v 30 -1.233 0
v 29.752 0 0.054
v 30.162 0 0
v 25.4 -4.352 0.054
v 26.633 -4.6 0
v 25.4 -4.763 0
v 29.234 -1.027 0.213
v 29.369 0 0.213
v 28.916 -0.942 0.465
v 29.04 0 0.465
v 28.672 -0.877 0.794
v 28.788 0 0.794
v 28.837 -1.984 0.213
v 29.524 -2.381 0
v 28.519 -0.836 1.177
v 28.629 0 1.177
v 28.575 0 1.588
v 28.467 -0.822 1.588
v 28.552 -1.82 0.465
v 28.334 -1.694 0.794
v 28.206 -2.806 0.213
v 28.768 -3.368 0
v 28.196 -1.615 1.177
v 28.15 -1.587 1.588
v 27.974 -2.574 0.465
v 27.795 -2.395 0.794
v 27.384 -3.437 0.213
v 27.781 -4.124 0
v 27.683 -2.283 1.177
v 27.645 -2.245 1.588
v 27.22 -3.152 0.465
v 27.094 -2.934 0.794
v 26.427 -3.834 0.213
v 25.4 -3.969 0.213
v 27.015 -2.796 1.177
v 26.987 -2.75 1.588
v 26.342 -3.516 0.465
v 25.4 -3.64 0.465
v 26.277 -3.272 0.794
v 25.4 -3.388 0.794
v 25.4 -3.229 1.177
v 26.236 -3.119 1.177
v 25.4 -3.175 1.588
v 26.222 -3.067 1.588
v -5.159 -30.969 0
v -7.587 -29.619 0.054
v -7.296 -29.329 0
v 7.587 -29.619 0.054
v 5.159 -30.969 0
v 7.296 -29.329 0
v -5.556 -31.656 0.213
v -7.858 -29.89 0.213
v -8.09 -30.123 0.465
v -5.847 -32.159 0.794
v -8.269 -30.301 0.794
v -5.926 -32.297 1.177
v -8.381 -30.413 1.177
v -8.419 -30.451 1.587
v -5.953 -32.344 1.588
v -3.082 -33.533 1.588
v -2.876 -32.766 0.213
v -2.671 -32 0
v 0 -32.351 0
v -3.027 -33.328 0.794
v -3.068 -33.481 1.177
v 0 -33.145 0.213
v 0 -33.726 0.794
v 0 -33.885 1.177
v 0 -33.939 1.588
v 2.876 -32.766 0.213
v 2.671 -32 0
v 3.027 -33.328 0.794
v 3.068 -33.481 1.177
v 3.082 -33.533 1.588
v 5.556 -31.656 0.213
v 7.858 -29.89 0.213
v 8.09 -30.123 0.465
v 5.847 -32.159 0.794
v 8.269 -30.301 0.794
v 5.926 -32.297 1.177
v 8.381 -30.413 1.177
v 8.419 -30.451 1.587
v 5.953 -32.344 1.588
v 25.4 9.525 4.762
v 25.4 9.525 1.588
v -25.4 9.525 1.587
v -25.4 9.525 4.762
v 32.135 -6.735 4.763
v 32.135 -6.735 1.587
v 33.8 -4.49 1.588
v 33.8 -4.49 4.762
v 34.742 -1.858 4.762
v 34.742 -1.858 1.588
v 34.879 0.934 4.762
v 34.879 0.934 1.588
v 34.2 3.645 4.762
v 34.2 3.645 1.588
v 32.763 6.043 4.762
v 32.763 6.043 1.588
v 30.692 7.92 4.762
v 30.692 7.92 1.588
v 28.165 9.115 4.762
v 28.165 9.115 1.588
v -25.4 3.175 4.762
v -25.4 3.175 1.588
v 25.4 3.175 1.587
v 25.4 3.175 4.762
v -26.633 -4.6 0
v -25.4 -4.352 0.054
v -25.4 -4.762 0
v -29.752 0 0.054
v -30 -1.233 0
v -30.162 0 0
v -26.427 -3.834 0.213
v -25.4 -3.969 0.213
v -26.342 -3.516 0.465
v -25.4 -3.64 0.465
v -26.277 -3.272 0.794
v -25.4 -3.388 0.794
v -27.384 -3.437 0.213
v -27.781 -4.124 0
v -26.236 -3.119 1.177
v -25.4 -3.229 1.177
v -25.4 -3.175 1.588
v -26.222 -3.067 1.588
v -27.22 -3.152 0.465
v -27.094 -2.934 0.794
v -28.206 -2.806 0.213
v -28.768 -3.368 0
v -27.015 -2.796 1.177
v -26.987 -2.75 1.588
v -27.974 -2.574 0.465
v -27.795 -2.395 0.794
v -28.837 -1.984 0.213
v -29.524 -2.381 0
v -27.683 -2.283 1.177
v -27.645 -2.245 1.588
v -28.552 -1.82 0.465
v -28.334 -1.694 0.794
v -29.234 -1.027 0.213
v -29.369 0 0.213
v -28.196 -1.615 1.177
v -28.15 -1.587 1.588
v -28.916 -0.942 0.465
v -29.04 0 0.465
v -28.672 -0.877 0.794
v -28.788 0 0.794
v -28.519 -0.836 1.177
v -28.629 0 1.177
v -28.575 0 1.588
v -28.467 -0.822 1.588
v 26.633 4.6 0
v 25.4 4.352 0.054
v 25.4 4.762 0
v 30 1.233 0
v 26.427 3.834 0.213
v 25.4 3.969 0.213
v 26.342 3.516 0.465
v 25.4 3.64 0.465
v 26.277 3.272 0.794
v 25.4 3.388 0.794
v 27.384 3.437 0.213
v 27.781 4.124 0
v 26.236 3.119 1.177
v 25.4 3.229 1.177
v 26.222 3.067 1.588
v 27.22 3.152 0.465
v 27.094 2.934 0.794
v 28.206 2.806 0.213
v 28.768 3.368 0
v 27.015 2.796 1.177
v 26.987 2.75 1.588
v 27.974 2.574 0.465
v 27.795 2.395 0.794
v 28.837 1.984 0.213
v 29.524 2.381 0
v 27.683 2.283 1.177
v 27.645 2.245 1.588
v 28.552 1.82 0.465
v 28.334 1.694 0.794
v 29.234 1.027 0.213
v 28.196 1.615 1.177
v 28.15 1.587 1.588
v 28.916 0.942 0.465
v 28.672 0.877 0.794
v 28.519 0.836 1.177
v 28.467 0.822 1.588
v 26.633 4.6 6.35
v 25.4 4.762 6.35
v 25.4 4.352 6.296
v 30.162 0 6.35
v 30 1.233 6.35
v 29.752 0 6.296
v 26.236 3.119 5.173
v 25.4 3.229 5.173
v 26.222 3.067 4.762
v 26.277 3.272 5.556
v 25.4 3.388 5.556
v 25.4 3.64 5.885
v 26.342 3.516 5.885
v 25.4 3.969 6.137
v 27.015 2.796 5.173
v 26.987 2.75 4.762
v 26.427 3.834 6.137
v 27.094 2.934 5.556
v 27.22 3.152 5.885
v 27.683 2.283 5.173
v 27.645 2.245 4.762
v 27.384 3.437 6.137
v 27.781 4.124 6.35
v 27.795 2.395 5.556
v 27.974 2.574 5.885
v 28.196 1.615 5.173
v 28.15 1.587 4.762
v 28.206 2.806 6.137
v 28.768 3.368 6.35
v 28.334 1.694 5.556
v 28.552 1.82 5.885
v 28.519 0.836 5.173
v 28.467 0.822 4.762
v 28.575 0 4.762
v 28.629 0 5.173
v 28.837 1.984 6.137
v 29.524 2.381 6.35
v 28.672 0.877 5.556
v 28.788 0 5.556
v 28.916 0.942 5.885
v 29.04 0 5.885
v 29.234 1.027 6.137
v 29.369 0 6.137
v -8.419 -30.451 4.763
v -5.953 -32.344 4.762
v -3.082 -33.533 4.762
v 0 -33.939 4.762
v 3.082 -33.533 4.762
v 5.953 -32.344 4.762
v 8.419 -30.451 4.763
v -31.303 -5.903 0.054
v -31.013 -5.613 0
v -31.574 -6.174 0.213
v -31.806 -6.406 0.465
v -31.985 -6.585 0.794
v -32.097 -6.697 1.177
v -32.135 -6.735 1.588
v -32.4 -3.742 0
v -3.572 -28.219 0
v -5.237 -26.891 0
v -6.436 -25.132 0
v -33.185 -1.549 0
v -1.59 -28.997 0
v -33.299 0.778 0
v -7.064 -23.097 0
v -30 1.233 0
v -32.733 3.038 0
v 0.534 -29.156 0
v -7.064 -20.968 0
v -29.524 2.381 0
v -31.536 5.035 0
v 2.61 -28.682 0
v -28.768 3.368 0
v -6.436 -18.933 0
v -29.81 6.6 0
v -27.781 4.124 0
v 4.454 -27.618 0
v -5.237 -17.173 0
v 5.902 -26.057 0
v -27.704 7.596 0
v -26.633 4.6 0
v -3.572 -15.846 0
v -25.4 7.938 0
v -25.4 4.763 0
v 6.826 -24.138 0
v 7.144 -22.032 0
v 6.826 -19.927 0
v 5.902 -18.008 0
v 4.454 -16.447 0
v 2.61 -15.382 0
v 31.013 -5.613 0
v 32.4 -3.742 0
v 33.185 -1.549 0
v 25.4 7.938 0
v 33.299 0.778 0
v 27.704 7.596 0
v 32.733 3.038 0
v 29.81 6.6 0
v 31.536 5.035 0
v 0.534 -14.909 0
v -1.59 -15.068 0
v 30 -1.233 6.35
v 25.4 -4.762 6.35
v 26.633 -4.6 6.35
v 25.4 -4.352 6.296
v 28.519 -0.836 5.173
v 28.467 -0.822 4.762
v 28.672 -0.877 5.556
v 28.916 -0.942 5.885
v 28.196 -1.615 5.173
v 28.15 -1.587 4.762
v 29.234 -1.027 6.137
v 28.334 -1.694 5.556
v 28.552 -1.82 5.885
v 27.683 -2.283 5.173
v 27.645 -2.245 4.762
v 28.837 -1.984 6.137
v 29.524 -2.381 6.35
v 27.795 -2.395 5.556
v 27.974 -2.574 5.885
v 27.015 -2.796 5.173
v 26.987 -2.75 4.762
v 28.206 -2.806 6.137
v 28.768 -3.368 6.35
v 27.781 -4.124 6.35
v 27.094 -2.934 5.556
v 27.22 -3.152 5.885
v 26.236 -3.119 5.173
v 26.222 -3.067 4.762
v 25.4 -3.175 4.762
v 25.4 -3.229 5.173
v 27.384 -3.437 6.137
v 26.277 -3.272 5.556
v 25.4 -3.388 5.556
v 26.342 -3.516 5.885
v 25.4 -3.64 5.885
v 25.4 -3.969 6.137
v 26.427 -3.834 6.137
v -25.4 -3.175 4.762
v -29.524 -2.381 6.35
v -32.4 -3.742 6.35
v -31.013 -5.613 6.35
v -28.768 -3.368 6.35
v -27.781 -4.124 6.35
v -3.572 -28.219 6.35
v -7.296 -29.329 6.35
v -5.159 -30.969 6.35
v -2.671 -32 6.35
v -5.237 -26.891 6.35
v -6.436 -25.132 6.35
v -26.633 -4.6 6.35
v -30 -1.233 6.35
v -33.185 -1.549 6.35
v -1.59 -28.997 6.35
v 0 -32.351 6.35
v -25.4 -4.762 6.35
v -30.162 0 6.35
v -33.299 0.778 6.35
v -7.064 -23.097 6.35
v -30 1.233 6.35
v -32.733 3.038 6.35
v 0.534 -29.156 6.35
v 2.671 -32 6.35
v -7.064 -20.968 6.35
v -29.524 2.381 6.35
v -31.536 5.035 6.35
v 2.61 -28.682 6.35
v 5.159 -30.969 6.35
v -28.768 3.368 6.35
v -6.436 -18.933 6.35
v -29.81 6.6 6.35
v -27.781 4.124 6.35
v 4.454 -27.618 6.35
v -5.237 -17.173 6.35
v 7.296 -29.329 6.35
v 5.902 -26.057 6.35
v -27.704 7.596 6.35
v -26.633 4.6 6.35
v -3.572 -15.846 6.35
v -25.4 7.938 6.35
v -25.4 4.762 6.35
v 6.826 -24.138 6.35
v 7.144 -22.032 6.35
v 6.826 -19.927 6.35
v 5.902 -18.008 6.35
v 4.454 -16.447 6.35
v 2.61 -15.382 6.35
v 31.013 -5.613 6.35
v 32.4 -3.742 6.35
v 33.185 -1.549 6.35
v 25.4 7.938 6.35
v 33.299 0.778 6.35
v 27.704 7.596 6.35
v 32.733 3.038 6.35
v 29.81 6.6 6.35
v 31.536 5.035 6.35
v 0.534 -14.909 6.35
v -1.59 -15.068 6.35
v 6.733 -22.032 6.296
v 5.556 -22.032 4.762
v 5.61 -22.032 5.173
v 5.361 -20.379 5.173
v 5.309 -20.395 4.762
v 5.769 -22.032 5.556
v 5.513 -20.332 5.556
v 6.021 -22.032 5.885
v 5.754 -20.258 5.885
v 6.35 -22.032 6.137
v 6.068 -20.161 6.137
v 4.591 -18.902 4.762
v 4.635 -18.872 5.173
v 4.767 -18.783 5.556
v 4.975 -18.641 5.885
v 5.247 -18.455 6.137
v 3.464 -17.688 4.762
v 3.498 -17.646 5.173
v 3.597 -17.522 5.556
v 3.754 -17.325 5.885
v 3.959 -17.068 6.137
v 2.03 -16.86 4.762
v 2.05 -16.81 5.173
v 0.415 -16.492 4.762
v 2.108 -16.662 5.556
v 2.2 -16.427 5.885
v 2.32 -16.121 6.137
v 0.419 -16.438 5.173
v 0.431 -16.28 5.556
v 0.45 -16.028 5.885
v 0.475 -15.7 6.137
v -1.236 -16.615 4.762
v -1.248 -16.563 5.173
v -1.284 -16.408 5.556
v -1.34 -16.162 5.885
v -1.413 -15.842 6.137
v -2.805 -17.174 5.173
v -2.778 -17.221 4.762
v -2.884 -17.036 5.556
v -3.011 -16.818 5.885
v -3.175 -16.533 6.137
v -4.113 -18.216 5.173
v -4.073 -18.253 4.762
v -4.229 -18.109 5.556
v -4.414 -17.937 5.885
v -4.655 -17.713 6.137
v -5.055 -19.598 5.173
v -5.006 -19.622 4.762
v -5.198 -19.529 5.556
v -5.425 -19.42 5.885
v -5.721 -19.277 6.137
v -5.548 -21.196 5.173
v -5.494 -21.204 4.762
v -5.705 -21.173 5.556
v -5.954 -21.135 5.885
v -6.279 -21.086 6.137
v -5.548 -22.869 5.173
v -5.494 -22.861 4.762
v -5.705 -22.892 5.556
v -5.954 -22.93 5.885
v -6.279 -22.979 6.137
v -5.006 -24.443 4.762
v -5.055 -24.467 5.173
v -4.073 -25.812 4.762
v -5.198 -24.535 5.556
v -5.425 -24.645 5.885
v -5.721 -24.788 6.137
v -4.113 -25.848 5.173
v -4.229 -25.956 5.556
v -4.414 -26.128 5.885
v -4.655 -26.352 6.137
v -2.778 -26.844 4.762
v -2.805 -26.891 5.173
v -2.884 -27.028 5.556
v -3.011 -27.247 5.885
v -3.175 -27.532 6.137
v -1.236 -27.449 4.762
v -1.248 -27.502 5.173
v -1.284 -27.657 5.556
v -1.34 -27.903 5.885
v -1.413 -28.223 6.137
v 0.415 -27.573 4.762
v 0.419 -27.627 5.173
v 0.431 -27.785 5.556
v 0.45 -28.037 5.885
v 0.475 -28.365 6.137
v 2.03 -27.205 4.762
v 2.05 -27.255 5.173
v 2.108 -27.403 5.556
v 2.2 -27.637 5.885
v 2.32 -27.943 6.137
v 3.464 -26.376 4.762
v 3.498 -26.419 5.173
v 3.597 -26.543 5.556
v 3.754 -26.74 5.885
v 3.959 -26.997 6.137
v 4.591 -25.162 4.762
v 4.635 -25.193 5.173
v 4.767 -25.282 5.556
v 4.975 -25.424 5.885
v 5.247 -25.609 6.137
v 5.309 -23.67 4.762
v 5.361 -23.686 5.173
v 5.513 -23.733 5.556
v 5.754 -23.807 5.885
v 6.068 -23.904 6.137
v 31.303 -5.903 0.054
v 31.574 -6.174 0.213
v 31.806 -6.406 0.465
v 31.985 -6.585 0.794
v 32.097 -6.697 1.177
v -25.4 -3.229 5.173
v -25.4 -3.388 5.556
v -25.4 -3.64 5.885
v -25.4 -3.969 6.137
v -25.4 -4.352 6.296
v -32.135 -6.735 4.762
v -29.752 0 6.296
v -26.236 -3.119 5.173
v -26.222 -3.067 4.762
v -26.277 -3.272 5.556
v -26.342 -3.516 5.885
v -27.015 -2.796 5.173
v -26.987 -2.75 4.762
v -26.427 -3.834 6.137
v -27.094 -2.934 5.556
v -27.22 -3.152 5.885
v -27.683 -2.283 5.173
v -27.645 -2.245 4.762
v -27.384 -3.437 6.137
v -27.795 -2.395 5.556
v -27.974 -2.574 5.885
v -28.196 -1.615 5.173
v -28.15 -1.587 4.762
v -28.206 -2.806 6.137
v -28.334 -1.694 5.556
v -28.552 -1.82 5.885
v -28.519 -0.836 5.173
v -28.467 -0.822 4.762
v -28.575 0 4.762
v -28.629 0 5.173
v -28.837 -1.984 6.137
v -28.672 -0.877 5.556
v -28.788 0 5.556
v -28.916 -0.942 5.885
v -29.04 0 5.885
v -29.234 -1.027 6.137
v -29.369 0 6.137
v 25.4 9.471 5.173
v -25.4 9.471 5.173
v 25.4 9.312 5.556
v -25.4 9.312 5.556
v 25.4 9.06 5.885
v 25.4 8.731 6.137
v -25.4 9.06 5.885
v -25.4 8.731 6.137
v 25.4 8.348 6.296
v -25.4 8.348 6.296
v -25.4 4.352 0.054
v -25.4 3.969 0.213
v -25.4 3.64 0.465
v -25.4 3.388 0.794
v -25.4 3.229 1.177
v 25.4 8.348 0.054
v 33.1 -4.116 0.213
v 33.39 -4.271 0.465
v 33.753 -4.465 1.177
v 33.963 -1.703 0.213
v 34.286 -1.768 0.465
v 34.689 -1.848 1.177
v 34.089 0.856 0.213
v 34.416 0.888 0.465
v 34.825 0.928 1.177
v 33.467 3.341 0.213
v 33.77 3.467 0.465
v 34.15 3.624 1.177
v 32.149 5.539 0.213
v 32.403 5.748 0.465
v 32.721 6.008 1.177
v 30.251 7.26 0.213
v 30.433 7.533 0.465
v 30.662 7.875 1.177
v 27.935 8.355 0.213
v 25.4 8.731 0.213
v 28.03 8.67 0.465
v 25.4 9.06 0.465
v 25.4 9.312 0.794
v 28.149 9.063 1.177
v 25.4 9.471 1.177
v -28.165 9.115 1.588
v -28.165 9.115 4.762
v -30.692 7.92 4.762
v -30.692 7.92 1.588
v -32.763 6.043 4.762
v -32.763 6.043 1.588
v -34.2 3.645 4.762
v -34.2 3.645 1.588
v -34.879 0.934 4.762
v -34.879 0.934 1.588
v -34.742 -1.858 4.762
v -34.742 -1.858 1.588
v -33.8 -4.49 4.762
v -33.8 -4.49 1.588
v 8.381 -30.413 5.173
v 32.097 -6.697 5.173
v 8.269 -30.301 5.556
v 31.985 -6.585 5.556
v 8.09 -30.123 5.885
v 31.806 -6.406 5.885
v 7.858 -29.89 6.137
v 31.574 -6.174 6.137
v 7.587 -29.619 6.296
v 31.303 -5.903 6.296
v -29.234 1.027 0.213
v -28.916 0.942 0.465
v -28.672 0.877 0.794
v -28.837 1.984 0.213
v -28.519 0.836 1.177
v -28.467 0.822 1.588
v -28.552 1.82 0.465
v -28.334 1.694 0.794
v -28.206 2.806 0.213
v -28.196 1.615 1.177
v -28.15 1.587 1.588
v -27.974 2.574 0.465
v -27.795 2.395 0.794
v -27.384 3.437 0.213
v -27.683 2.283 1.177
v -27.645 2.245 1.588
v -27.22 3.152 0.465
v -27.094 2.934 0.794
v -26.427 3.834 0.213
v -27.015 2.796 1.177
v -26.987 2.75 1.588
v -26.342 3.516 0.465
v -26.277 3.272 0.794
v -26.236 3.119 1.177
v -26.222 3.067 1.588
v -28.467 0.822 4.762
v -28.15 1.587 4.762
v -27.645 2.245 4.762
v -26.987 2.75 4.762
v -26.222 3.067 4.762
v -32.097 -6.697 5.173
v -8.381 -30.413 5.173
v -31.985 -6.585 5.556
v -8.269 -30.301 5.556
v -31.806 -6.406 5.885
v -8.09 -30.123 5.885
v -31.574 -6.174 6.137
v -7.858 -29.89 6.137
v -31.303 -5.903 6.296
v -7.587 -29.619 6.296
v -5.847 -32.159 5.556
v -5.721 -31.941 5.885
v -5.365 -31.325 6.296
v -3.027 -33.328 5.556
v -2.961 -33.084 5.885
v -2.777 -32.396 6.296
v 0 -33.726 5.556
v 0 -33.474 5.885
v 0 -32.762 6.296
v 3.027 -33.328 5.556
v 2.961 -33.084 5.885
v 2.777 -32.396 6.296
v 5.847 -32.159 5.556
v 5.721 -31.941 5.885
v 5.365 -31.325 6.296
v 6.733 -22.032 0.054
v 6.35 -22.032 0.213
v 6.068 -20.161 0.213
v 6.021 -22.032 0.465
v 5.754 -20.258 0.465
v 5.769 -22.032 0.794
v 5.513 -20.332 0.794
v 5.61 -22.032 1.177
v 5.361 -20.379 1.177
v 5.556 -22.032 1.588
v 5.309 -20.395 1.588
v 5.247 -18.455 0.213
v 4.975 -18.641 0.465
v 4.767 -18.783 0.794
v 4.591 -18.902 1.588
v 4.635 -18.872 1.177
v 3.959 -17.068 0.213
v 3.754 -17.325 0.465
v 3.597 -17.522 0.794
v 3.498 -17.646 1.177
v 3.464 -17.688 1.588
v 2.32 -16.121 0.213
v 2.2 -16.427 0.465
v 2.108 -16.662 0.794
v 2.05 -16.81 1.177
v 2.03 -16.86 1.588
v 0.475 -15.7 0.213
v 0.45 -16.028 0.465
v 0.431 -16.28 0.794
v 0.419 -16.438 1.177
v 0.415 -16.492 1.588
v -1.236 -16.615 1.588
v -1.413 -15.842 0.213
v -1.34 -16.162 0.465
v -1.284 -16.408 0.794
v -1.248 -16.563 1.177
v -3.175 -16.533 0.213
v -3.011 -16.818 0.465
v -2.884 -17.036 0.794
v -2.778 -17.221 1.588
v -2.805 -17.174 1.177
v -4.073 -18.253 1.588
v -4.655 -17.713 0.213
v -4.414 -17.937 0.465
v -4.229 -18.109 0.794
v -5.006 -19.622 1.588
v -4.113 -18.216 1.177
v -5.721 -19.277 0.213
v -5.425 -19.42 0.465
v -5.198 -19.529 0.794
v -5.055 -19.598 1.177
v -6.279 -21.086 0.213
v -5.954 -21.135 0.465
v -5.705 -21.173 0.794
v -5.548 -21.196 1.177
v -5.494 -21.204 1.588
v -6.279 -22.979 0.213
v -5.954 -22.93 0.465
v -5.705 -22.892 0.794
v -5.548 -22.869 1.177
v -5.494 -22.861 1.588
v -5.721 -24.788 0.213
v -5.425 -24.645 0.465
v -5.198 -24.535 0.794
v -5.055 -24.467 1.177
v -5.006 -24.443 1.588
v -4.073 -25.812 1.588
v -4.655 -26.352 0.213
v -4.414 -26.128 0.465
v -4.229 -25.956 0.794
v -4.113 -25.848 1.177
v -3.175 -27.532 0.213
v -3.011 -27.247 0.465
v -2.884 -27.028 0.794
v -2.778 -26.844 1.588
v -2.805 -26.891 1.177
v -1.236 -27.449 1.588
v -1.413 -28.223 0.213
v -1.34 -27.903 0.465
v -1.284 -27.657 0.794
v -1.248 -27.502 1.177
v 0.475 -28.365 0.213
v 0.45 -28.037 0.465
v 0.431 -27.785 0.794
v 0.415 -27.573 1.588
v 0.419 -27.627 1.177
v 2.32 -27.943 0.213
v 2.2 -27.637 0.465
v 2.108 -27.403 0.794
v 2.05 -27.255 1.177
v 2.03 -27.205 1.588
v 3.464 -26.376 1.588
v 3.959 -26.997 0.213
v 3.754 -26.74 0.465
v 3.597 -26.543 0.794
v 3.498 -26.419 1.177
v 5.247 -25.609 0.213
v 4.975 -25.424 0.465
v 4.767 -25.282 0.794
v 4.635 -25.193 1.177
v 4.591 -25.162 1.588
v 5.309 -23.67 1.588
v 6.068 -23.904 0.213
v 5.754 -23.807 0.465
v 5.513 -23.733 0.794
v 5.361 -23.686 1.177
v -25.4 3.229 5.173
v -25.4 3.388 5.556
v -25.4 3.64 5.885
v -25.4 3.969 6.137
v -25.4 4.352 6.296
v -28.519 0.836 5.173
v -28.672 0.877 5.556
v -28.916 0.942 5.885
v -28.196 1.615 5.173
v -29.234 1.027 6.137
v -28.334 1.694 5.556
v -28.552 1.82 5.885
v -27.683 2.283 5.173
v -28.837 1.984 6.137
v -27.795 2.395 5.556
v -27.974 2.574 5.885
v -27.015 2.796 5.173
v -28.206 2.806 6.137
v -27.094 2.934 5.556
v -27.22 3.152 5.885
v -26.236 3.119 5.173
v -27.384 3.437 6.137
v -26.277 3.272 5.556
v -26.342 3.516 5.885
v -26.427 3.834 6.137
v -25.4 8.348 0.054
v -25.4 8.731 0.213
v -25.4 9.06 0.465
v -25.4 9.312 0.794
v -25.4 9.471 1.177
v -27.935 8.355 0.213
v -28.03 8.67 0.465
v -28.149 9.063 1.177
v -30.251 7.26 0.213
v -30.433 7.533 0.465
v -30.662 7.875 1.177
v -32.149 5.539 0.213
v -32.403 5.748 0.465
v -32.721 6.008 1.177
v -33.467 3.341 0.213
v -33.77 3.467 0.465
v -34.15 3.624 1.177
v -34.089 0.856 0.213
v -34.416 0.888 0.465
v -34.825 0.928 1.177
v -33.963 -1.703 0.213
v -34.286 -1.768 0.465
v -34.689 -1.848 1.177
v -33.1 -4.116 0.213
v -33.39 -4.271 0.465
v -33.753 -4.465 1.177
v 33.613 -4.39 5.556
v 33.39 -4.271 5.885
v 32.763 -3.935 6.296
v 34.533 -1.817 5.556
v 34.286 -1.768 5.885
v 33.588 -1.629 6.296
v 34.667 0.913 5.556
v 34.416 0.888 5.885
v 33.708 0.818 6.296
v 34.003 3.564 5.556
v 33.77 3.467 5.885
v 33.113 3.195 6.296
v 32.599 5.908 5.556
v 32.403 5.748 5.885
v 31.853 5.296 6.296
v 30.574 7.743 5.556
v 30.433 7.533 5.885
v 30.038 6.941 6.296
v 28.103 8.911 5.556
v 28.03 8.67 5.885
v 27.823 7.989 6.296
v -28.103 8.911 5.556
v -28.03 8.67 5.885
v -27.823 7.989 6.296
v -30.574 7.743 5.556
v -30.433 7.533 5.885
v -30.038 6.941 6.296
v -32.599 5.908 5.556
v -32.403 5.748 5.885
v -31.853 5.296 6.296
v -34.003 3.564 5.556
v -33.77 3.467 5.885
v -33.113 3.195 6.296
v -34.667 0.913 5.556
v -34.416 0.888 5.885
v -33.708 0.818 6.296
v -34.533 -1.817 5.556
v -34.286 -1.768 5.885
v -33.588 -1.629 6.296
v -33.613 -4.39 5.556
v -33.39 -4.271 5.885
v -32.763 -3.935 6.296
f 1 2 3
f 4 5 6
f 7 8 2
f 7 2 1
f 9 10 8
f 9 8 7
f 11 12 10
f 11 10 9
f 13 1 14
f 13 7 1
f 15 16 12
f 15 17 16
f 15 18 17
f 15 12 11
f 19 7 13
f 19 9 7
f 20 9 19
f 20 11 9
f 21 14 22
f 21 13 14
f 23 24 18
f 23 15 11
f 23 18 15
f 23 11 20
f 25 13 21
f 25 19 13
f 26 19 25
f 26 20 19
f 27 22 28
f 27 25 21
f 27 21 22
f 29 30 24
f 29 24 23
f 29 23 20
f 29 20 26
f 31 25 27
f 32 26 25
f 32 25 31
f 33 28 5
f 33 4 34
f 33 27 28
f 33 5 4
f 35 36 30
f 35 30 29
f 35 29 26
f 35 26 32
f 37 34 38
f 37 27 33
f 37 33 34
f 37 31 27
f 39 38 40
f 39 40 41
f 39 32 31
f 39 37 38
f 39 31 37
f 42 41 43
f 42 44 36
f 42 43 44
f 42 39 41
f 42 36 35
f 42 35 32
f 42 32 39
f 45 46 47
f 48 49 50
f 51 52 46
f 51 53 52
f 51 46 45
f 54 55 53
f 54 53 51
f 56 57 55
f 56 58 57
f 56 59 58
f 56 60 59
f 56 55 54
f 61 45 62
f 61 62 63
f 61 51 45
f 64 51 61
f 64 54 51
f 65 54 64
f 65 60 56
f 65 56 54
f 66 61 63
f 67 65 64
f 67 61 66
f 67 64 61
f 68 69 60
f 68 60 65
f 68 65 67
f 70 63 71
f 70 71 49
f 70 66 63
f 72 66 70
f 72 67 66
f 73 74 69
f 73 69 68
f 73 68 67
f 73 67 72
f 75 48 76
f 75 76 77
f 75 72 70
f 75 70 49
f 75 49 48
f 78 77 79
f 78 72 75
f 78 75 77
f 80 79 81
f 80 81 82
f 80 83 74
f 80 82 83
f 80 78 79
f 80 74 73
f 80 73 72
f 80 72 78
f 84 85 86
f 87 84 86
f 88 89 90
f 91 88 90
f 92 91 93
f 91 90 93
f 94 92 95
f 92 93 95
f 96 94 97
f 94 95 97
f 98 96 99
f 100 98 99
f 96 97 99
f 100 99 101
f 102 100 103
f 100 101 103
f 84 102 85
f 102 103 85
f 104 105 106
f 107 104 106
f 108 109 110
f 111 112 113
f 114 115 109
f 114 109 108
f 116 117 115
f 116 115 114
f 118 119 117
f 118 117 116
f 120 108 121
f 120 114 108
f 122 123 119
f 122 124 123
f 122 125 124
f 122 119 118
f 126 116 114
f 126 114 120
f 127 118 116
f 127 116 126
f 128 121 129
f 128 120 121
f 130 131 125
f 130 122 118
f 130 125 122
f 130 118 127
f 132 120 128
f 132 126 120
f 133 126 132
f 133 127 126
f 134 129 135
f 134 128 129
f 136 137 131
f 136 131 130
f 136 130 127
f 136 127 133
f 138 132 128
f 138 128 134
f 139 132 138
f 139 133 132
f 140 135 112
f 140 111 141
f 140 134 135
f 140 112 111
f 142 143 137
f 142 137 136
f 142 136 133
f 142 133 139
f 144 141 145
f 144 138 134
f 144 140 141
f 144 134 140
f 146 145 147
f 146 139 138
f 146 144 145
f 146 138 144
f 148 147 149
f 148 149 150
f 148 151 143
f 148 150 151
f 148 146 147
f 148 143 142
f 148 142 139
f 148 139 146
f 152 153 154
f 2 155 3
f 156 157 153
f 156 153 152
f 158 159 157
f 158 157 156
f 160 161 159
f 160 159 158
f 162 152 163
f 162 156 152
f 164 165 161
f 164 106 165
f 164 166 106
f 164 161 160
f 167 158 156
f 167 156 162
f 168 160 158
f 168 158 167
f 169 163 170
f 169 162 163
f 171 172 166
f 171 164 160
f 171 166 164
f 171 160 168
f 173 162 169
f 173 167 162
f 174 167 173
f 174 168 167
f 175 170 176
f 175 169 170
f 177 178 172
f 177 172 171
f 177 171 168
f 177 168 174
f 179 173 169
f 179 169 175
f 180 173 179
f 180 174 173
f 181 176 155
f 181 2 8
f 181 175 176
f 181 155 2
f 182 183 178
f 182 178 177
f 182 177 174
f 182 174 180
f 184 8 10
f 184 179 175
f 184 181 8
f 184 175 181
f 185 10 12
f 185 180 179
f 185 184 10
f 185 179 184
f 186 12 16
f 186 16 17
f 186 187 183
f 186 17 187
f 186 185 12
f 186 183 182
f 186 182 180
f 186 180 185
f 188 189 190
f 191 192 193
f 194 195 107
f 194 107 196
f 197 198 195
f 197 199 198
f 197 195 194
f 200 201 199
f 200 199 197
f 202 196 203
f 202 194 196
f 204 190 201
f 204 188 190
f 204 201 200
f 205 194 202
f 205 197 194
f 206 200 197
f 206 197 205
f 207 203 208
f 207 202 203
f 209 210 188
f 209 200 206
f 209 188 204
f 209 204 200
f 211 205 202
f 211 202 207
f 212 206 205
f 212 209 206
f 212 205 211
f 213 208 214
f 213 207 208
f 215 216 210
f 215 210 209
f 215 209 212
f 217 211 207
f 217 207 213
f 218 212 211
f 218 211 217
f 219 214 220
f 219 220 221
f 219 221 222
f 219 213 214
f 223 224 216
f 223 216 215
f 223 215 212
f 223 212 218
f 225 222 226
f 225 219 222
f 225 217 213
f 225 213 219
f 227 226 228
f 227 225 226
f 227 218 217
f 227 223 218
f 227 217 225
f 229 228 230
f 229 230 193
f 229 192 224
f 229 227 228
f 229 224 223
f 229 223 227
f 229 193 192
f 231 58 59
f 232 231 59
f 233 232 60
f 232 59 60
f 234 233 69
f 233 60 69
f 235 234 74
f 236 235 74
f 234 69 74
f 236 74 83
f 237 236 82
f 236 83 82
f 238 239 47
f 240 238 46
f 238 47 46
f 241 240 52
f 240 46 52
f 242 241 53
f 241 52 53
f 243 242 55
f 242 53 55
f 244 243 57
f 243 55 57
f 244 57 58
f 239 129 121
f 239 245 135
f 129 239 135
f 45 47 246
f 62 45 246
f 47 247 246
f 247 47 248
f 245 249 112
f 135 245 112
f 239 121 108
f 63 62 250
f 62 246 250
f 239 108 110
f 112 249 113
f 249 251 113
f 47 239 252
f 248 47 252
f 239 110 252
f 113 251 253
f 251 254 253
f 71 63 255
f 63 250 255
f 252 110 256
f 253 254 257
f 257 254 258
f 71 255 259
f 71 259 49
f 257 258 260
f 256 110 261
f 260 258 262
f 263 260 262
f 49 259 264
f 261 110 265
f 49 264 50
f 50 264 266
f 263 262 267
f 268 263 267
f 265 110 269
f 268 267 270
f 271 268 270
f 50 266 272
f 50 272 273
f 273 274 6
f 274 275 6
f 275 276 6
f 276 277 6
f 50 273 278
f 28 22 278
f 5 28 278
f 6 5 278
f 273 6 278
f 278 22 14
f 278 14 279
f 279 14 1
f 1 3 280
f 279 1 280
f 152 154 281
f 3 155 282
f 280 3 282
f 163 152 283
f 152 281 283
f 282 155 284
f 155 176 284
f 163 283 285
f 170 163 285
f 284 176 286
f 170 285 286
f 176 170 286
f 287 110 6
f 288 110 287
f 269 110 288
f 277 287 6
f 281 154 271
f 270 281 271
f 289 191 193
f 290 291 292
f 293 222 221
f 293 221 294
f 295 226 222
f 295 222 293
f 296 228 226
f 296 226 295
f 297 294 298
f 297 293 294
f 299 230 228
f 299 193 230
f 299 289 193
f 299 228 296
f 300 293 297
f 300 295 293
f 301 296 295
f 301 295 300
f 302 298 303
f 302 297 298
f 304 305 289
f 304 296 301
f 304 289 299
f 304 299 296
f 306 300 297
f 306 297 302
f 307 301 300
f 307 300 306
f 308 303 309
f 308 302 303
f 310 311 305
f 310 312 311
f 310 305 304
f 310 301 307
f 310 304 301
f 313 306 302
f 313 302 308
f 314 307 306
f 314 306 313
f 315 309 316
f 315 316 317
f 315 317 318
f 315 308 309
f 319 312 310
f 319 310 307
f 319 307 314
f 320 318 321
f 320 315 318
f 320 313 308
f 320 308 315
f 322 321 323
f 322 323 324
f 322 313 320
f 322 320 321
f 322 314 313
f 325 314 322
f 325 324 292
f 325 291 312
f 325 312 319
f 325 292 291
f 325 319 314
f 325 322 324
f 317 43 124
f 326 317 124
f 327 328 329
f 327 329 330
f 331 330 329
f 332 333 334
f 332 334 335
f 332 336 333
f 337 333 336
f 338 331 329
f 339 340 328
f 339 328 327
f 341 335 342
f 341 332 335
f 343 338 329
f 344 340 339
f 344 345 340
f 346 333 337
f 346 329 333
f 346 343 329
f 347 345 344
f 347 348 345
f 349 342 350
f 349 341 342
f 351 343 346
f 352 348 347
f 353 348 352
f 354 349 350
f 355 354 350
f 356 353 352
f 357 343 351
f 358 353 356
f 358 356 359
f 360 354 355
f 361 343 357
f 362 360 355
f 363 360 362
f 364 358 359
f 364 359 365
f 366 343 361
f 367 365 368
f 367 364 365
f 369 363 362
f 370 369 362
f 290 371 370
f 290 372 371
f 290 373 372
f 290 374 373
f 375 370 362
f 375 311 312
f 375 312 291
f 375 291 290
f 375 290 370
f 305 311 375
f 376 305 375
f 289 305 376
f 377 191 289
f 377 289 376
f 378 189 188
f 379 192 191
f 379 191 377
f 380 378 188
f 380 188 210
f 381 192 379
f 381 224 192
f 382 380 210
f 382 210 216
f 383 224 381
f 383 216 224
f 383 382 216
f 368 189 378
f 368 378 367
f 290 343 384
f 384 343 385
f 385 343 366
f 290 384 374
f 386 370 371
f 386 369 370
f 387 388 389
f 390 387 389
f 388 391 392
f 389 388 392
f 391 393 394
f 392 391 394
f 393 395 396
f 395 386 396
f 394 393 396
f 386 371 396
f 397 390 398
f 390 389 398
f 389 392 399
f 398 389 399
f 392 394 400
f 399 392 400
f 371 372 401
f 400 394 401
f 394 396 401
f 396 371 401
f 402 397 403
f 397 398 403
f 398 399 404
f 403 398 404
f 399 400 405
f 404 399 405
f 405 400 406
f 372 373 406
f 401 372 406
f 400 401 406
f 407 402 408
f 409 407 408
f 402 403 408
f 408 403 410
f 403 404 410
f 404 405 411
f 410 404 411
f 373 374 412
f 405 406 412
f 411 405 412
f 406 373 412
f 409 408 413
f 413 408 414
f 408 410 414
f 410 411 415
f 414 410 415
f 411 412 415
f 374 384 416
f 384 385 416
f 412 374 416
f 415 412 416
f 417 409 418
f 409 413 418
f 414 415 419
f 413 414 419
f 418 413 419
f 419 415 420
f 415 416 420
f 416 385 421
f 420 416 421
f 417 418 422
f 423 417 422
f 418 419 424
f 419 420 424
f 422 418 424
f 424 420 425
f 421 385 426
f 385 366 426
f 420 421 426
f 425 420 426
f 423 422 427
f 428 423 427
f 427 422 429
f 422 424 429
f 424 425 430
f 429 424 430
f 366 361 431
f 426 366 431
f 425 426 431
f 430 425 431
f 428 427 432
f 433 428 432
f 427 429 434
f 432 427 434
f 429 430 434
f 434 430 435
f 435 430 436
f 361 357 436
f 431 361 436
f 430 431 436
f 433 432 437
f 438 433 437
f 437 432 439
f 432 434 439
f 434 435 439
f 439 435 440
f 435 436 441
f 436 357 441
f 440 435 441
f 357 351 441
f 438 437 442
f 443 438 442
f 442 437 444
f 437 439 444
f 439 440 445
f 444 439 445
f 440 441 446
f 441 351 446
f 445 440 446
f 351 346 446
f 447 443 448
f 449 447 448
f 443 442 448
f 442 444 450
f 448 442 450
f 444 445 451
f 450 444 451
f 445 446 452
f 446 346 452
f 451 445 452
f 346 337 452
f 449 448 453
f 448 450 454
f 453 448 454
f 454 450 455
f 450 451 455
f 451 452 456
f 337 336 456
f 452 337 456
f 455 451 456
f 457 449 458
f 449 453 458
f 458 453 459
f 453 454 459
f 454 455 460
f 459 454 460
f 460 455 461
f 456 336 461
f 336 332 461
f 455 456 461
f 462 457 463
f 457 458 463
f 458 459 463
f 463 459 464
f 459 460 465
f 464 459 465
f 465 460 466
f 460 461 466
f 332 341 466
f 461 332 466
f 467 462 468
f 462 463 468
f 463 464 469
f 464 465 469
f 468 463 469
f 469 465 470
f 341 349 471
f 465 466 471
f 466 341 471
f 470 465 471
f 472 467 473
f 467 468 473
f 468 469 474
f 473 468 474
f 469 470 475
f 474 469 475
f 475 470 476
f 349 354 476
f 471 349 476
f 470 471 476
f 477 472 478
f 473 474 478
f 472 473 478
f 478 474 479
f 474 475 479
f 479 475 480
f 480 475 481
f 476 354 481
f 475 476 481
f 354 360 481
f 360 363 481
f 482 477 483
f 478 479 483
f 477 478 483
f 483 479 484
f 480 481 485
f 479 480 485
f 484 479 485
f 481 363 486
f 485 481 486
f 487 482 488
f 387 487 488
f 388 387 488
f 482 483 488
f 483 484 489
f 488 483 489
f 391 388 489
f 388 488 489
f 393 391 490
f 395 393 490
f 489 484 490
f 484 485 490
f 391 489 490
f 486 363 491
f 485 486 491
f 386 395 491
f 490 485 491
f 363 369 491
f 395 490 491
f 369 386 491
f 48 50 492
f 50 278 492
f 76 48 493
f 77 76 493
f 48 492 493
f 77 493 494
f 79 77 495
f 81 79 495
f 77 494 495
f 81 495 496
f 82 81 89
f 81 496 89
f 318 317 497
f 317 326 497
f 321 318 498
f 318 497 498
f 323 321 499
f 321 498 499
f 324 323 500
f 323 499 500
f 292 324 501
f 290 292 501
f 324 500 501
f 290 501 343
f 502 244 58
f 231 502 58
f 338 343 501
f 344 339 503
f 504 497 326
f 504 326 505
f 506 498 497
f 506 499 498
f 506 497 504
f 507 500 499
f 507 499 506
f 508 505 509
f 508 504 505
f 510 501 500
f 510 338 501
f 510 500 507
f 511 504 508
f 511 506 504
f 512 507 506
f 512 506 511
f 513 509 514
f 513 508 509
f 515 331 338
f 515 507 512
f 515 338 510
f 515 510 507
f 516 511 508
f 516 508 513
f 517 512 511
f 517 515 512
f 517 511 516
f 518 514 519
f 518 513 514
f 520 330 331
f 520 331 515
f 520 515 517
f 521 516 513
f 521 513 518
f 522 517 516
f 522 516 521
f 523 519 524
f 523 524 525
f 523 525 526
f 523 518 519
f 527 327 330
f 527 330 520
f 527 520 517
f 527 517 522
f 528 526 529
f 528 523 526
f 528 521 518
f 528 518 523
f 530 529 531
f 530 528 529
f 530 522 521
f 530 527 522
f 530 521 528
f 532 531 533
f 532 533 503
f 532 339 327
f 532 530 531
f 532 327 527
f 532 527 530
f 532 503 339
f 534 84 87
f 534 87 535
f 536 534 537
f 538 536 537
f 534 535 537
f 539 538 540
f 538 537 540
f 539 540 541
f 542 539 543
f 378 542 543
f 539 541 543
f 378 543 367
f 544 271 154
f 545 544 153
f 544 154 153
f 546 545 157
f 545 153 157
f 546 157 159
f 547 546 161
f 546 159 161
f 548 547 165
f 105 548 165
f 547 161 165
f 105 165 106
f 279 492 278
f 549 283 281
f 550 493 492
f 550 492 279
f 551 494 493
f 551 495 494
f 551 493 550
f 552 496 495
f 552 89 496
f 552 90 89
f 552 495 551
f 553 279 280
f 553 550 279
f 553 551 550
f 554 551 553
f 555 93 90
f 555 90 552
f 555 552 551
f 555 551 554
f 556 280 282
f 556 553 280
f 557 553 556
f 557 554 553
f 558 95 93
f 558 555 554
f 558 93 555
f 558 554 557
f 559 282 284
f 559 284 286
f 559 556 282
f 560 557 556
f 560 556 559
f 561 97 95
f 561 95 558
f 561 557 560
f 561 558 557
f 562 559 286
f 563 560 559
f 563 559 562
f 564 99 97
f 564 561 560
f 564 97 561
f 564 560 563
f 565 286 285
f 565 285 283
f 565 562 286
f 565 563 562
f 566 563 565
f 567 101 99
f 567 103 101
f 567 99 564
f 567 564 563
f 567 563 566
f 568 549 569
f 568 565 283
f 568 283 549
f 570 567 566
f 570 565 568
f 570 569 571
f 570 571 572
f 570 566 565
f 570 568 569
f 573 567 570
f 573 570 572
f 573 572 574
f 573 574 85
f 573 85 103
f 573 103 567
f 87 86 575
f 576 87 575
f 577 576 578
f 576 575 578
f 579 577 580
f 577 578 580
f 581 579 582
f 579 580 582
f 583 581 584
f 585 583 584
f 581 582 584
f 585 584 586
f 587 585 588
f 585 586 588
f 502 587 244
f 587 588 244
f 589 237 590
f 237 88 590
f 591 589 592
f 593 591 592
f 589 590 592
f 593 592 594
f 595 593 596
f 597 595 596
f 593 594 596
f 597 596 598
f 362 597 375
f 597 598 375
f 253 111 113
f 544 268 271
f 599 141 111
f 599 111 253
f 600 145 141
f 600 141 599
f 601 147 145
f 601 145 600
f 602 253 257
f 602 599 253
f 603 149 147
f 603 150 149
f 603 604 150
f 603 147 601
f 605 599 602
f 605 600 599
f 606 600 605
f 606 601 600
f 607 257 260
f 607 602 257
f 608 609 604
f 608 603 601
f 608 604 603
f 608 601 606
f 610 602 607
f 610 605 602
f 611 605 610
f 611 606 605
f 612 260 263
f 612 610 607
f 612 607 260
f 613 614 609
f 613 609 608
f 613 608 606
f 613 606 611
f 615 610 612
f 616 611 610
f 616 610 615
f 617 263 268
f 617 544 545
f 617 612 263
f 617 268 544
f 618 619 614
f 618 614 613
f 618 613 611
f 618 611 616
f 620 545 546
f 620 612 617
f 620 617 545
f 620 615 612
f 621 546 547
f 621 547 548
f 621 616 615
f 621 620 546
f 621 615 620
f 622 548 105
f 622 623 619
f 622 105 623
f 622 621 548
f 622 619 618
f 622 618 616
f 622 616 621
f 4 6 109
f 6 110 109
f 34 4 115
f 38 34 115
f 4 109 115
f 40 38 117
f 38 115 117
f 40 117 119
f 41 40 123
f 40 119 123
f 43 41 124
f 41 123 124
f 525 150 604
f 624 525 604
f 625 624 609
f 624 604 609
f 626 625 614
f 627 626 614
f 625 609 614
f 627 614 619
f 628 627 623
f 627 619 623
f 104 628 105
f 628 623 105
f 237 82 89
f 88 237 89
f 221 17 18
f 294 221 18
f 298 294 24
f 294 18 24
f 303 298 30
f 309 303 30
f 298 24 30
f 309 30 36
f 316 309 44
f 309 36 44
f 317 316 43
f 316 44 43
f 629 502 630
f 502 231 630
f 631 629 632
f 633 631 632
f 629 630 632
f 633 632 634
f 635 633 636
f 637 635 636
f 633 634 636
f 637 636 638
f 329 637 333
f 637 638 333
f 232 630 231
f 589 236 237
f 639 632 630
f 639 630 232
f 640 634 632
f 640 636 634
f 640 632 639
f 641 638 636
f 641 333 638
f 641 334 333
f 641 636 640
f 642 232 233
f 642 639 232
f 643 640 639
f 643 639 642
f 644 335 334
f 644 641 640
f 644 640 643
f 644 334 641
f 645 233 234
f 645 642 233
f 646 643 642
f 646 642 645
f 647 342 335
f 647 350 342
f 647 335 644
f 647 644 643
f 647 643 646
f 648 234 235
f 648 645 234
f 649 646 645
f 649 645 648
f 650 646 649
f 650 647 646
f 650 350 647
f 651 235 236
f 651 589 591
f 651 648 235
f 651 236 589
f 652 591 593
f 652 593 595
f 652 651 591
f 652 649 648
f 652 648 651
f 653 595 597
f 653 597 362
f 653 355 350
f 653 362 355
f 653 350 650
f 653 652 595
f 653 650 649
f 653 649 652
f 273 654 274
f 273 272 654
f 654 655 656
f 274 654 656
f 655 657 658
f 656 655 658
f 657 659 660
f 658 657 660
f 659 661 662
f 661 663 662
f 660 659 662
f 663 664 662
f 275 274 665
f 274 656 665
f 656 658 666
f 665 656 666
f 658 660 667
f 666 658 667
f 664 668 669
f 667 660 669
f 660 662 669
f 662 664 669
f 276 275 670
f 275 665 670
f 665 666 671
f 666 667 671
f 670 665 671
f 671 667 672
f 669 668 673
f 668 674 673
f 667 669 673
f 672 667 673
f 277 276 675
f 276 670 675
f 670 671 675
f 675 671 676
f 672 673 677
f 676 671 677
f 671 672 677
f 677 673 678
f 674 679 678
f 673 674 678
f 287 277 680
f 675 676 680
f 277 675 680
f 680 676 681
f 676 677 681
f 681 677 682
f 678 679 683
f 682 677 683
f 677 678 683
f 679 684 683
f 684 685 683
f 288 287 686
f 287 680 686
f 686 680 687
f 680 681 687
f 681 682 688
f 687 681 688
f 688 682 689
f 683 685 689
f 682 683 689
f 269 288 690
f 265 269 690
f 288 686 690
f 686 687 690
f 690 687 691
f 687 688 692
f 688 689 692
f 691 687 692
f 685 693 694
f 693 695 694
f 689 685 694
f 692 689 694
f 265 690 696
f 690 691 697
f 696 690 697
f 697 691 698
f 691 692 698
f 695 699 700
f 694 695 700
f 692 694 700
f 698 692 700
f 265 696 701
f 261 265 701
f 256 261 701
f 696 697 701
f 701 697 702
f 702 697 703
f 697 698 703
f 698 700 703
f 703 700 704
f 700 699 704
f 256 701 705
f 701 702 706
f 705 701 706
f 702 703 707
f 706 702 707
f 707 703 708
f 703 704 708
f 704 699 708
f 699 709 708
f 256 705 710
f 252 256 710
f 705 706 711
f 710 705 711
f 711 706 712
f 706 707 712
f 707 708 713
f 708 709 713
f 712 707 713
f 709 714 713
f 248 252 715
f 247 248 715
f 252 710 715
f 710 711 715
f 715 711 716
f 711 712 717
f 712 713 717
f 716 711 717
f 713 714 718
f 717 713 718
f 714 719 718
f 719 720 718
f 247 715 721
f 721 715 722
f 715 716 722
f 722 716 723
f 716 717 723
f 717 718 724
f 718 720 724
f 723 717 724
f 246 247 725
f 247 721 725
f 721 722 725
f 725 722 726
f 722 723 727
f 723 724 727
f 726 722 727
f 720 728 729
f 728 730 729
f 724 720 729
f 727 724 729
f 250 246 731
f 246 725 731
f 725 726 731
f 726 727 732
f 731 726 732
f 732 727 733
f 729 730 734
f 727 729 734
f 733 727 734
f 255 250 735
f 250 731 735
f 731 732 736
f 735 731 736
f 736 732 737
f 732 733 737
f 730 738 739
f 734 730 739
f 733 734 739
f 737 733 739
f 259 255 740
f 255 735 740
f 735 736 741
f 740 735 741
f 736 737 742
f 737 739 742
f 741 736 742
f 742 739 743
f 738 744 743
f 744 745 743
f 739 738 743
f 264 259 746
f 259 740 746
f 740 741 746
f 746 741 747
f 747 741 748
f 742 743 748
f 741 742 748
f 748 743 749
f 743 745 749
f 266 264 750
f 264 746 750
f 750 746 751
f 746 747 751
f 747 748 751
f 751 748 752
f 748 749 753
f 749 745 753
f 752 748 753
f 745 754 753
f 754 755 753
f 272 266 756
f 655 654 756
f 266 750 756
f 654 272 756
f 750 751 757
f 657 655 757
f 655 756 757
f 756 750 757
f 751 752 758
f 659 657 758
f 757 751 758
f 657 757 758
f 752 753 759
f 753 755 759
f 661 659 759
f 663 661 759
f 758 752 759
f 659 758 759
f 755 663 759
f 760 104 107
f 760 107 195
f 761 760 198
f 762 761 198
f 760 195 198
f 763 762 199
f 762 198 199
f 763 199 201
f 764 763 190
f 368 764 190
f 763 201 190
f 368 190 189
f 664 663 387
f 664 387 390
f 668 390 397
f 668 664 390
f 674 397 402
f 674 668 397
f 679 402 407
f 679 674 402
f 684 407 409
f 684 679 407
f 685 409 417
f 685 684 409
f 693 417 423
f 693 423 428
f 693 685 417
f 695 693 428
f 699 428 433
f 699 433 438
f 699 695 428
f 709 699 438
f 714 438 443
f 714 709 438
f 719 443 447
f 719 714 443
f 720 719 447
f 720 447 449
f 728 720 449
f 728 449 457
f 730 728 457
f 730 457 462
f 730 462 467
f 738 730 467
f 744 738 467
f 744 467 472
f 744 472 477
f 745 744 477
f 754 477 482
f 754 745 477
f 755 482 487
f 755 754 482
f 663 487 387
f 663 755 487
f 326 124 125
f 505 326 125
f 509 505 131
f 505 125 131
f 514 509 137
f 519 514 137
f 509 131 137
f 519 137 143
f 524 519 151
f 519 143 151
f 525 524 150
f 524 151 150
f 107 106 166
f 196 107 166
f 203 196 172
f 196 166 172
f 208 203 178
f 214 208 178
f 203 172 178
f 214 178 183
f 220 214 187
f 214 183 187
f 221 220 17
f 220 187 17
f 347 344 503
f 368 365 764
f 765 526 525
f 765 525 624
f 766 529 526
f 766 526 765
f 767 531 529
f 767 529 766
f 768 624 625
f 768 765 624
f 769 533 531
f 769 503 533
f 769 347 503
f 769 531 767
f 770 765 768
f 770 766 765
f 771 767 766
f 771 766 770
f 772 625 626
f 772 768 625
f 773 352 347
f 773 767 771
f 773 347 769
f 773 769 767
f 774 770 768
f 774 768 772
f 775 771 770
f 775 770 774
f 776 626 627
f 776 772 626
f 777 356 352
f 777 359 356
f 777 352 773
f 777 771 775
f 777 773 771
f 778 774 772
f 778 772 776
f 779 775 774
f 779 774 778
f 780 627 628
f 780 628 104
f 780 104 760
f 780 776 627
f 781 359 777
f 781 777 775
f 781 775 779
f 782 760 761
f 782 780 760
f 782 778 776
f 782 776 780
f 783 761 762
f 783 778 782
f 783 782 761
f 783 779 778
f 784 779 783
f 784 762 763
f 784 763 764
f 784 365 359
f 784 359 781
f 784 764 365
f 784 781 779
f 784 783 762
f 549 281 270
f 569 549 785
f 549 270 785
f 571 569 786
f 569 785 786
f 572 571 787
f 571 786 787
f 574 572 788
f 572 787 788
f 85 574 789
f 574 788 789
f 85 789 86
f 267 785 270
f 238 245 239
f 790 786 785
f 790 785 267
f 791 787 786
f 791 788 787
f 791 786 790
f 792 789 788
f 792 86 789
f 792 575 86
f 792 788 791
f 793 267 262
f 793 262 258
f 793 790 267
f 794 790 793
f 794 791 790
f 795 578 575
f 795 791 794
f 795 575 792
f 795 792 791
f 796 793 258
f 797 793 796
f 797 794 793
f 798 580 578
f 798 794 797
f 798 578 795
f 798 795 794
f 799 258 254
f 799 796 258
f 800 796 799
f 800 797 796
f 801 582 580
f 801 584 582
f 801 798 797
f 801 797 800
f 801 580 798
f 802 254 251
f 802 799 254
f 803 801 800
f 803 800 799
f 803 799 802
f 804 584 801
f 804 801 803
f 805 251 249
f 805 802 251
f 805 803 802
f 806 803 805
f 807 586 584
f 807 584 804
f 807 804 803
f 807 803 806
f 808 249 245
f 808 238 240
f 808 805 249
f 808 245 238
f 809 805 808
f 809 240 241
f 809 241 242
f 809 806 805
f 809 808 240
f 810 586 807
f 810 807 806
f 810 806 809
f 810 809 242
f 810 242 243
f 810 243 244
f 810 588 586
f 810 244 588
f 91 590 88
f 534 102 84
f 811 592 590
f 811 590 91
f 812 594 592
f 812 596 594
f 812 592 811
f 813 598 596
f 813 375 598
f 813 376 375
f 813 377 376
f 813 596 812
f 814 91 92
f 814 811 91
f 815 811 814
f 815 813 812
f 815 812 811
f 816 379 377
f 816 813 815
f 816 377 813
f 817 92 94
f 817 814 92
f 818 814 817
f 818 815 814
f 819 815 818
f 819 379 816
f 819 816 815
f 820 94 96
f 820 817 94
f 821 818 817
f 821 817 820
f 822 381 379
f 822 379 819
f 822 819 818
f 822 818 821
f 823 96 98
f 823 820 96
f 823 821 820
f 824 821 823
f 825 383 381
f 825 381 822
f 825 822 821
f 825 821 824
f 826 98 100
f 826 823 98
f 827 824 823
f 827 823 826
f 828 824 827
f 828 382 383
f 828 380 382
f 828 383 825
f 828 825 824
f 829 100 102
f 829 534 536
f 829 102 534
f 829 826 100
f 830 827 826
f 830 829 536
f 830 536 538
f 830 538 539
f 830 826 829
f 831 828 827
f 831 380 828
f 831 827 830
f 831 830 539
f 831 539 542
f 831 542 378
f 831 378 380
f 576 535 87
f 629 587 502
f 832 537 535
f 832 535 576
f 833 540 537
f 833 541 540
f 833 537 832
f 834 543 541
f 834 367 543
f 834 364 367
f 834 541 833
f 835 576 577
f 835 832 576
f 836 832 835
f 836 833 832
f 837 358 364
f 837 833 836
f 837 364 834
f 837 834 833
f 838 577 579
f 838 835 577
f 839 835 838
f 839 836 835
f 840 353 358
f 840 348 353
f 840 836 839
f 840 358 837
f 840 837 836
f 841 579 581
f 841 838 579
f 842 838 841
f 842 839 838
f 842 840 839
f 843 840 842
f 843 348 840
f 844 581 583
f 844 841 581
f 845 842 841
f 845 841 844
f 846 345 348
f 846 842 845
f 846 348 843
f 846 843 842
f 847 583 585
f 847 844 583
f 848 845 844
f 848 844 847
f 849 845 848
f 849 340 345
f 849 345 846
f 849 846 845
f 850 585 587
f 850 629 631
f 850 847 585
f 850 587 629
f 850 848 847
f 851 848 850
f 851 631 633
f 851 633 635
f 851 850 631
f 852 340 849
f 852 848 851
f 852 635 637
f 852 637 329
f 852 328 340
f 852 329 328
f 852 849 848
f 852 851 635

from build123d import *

# Parameters (mm, degrees)
F0_R     = 5.55625
F1_DEPTH = 6.35
F2_R     = 1.5875
F3_R     = 1.5875


with BuildPart() as f1:
    # F0 (on Top) → F1 (new body)
    with BuildSketch(Plane.XY):
        with BuildLine():
            Line((25.4, 9.525), (-25.4, 9.525))
            ThreePointArc((-25.4, 9.525), (-34.199953, 3.64506), (-32.135192, -6.735192))
            Line((-32.135192, -6.735192), (-8.41899, -30.451394))
            ThreePointArc((-8.41899, -30.451394), (0, -33.938654), (8.41899, -30.451394))
            Line((8.41899, -30.451394), (32.135192, -6.735192))
            ThreePointArc((32.135192, -6.735192), (34.199953, 3.64506), (25.4, 9.525))
        make_face()
        with Locations((0, -22.032404)):
            Circle(F0_R, mode=Mode.SUBTRACT)
        with BuildLine():
            ThreePointArc((-28.575, 0), (-27.645064, 2.245064), (-25.4, 3.175))
            Line((-25.4, 3.175), (25.4, 3.175))
            ThreePointArc((25.4, 3.175), (27.645064, 2.245064), (28.575, 0))
            ThreePointArc((28.575, 0), (27.645064, -2.245064), (25.4, -3.175))
            Line((25.4, -3.175), (-25.4, -3.175))
            ThreePointArc((-25.4, -3.175), (-27.645064, -2.245064), (-28.575, 0))
        make_face(mode=Mode.SUBTRACT)
    extrude(amount=F1_DEPTH)

    # F2
    f2_edges = [f1.edges().sort_by_distance(p)[0] for p in [
        (20.277091, -18.593293, 6.35),
        (34.199953, 3.64506, 6.35),
        (0, 9.525, 6.35),
        (-34.199953, 3.64506, 6.35),
        (-20.277091, -18.593293, 6.35),
        (0, -33.938654, 6.35),
        (-5.55625, -22.032404, 6.35),
        (-28.575, 0, 6.35),
        (0, 3.175, 6.35),
        (28.575, 0, 6.35),
        (0, -3.175, 6.35),
    ]]
    fillet(f2_edges, radius=F2_R)

    # F3
    f3_edges = [f1.edges().sort_by_distance(p)[0] for p in [
        (20.277091, -18.593293, 0),
        (34.199953, 3.64506, 0),
        (0, 9.525, 0),
        (-34.199953, 3.64506, 0),
        (-20.277091, -18.593293, 0),
        (0, -33.938654, 0),
        (-5.55625, -22.032404, 0),
        (-28.575, 0, 0),
        (0, 3.175, 0),
        (28.575, 0, 0),
        (0, -3.175, 0),
    ]]
    fillet(f3_edges, radius=F3_R)


solid = f1.part
